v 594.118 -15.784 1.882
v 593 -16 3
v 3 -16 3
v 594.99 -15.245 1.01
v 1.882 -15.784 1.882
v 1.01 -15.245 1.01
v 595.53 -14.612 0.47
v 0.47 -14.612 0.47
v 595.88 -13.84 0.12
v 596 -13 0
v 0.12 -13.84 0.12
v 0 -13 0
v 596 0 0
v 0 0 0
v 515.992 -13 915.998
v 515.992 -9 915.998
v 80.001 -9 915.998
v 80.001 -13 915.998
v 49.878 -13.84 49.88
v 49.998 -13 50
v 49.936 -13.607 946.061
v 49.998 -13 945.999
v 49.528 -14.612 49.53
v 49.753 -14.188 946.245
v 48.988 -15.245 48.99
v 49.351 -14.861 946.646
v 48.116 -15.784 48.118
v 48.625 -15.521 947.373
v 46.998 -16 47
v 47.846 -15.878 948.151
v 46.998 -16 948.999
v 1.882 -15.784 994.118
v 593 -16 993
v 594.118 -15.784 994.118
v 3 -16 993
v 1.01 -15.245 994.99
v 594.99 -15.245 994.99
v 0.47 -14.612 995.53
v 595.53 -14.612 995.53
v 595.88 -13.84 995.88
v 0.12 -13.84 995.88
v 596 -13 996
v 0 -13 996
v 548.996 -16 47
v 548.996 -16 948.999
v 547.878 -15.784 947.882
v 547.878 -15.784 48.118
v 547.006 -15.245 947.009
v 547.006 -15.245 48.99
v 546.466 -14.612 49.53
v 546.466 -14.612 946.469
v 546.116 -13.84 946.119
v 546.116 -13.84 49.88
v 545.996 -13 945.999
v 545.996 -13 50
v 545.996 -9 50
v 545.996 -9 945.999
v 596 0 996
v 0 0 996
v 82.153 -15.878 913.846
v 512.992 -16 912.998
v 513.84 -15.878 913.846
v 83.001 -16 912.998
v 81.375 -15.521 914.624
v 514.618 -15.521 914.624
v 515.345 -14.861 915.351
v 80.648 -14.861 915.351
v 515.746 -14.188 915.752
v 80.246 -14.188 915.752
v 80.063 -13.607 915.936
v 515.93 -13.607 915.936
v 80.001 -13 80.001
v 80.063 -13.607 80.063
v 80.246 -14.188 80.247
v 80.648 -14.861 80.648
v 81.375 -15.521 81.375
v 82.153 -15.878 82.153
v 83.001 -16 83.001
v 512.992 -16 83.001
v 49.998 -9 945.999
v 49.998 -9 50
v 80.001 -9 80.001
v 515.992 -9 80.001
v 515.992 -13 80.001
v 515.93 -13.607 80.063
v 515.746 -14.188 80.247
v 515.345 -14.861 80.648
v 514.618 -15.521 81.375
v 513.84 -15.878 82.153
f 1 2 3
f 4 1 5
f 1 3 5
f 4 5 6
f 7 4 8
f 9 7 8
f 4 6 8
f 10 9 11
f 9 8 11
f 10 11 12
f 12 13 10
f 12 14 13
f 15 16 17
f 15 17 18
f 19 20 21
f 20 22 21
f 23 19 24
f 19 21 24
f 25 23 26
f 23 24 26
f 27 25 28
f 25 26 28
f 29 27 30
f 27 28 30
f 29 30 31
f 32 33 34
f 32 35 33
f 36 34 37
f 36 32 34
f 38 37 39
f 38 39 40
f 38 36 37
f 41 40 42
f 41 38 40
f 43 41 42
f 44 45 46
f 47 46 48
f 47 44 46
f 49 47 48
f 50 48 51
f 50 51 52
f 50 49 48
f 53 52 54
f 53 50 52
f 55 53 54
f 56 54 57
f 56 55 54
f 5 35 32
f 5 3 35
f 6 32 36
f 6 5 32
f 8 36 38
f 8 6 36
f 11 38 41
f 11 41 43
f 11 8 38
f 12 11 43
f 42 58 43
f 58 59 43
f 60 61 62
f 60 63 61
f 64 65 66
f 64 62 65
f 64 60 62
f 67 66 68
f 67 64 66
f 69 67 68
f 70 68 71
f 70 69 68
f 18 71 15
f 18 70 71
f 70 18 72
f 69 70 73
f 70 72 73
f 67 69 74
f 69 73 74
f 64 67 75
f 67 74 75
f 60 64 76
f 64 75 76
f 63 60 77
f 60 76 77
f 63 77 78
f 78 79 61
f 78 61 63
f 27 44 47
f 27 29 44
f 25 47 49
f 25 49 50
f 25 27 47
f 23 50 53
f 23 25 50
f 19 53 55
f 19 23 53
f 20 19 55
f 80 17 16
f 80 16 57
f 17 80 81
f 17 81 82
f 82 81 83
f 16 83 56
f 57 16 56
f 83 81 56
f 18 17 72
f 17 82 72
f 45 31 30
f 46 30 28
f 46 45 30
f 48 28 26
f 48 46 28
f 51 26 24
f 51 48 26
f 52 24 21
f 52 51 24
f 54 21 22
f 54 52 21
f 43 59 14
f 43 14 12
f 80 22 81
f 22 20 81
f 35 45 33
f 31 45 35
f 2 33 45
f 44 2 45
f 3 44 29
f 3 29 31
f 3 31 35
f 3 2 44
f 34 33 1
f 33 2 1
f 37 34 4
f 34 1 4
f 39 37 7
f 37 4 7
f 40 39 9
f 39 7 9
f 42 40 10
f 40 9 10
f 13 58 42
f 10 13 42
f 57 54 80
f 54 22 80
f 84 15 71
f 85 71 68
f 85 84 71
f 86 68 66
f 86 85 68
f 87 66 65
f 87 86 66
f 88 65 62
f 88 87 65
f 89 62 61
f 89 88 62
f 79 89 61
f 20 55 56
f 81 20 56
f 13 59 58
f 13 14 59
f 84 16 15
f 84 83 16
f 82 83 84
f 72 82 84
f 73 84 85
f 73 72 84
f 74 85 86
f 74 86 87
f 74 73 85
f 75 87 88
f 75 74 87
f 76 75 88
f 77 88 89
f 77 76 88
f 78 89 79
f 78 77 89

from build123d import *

# Parameters (mm, degrees)
F0_W      = 44.656470418
F0_H      = 33.8078811765
F1_DEPTH  = 16
F2_DEPTH  = 796
F3_DEPTH  = 196
F4_W      = 68.9578056335
F4_H      = 493.6993122101
F5_DEPTH  = 7
F6_DEPTH  = 9.7
F7_DEPTH  = 99.33
F8_DEPTH  = 99.33
F9_DEPTH  = 17.34
F10_DEPTH = 102.97
F11_W     = 35.2807044983
F11_H     = 492.0964837074
F12_DEPTH = 7
F13_DEPTH = 37.27
F14_DEPTH = 6.58
F15_DEPTH = 106.63
F16_DEPTH = 5.87
F17_DEPTH = 200
F18_DEPTH = 200
F19_DEPTH = 200
F20_DEPTH = 200
F21_DEPTH = 200
F22_DEPTH = 200
F23_DEPTH = 200
F24_DEPTH = 200
F25_DEPTH = 200
F26_R     = 3


with BuildPart() as f1:
    # F0 (on Front) → F1 (new body)
    with BuildSketch(Plane.XZ):
        with Locations((22.328235209, 16.9039405882)):
            Rectangle(F0_W, F0_H)
    extrude(amount=F1_DEPTH)

    # F2 (add): a face of the model
    f2_faces = [f1.faces().sort_by_distance(p)[0] for p in [
        (22.328235209, -8, 0),
    ]]
    extrude(f2_faces, amount=-F2_DEPTH)

    # F3 (add): a face of the model
    f3_faces = [f1.faces().sort_by_distance(p)[0] for p in [
        (0, -8, 398),
    ]]
    extrude(f3_faces, amount=-F3_DEPTH)

    # F4 (on face) → F5 (cut)
    with BuildSketch(Plane.XZ.offset(16)):
        with Locations((94.1769480705, 399.8196721077)):
            Rectangle(F4_W, F4_H)
    extrude(amount=-F5_DEPTH, mode=Mode.SUBTRACT)

    # F6 (cut): a face of the model
    f6_faces = [f1.faces().sort_by_distance(p)[0] for p in [
        (59.6980452538, -12.5, 399.8196721077),
    ]]
    extrude(f6_faces, amount=-F6_DEPTH, mode=Mode.SUBTRACT)

    # F7 (add): a face of the model
    f7_faces = [f1.faces().sort_by_distance(p)[0] for p in [
        (89.3269480705, -12.5, 646.6693282127),
    ]]
    extrude(f7_faces, amount=-F7_DEPTH)

    # F8 (cut): a face of the model
    f8_faces = [f1.faces().sort_by_distance(p)[0] for p in [
        (89.3269480705, -12.5, 646.6693282127),
    ]]
    extrude(f8_faces, amount=-F8_DEPTH, mode=Mode.SUBTRACT)

    # F9 (cut): a face of the model
    f9_faces = [f1.faces().sort_by_distance(p)[0] for p in [
        (128.6558508873, -12.5, 449.4846721077),
    ]]
    extrude(f9_faces, amount=-F9_DEPTH, mode=Mode.SUBTRACT)

    # F10 (cut): a face of the model
    f10_faces = [f1.faces().sort_by_distance(p)[0] for p in [
        (97.9969480705, -12.5, 152.9700160027),
    ]]
    extrude(f10_faces, amount=-F10_DEPTH, mode=Mode.SUBTRACT)

    # F11 (on face) → F12 (join)
    with BuildSketch(Plane.XZ.offset(9)):
        with Locations((91.7714834213, 432.6795041561)):
            Rectangle(F11_W, F11_H)
    extrude(amount=F12_DEPTH)

    # F13 (add): a face of the model
    f13_faces = [f1.faces().sort_by_distance(p)[0] for p in [
        (91.7714834213, -12.5, 678.7277460098),
    ]]
    extrude(f13_faces, amount=F13_DEPTH)

    # F14 (add): a face of the model
    f14_faces = [f1.faces().sort_by_distance(p)[0] for p in [
        (109.4118356705, -12.5, 451.3145041561),
    ]]
    extrude(f14_faces, amount=F14_DEPTH)

    # F15 (add): a face of the model
    f15_faces = [f1.faces().sort_by_distance(p)[0] for p in [
        (95.0614834213, -12.5, 186.6312623024),
    ]]
    extrude(f15_faces, amount=F15_DEPTH)

    # F16 (cut): a face of the model
    f16_faces = [f1.faces().sort_by_distance(p)[0] for p in [
        (74.1311311722, -12.5, 397.9995041561),
    ]]
    extrude(f16_faces, amount=-F16_DEPTH, mode=Mode.SUBTRACT)

    # F17 (add): a face of the model
    f17_faces = [f1.faces().sort_by_distance(p)[0] for p in [
        (196, -8, 398),
    ]]
    extrude(f17_faces, amount=F17_DEPTH)

    # F18 (cut): a face of the model
    f18_faces = [f1.faces().sort_by_distance(p)[0] for p in [
        (145.9958508873, -12.5, 397.9996721077),
    ]]
    extrude(f18_faces, amount=-F18_DEPTH, mode=Mode.SUBTRACT)

    # F19 (add): a face of the model
    f19_faces = [f1.faces().sort_by_distance(p)[0] for p in [
        (115.9918356705, -12.5, 397.9995041561),
    ]]
    extrude(f19_faces, amount=F19_DEPTH)

    # F20 (add): a face of the model
    f20_faces = [f1.faces().sort_by_distance(p)[0] for p in [
        (396, -8, 398),
    ]]
    extrude(f20_faces, amount=F20_DEPTH)

    # F21 (cut): a face of the model
    f21_faces = [f1.faces().sort_by_distance(p)[0] for p in [
        (345.9958508873, -12.5, 397.9996721077),
    ]]
    extrude(f21_faces, amount=-F21_DEPTH, mode=Mode.SUBTRACT)

    # F22 (add): a face of the model
    f22_faces = [f1.faces().sort_by_distance(p)[0] for p in [
        (315.9918356705, -12.5, 397.9995041561),
    ]]
    extrude(f22_faces, amount=F22_DEPTH)

    # F23 (add): a face of the model
    f23_faces = [f1.faces().sort_by_distance(p)[0] for p in [
        (298, -8, 796),
    ]]
    extrude(f23_faces, amount=F23_DEPTH)

    # F24 (cut): a face of the model
    f24_faces = [f1.faces().sort_by_distance(p)[0] for p in [
        (297.9969480705, -12.5, 745.9993282127),
    ]]
    extrude(f24_faces, amount=-F24_DEPTH, mode=Mode.SUBTRACT)

    # F25 (add): a face of the model
    f25_faces = [f1.faces().sort_by_distance(p)[0] for p in [
        (297.9964834213, -12.5, 715.9977460098),
    ]]
    extrude(f25_faces, amount=F25_DEPTH)

    # F26
    f26_edges = [f1.edges().sort_by_distance(p)[0] for p in [
        (0, -16, 498),
        (298, -16, 0),
        (596, -16, 498),
        (298, -16, 996),
        (297.996948, -16, 50.000016),
        (49.998045, -16, 497.999672),
        (297.996948, -16, 945.999328),
        (545.995851, -16, 497.999672),
        (80.001131, -16, 497.999504),
        (297.996483, -16, 80.001262),
        (515.991836, -16, 497.999504),
        (297.996483, -16, 915.997746),
    ]]
    fillet(f26_edges, radius=F26_R)


solid = f1.part
